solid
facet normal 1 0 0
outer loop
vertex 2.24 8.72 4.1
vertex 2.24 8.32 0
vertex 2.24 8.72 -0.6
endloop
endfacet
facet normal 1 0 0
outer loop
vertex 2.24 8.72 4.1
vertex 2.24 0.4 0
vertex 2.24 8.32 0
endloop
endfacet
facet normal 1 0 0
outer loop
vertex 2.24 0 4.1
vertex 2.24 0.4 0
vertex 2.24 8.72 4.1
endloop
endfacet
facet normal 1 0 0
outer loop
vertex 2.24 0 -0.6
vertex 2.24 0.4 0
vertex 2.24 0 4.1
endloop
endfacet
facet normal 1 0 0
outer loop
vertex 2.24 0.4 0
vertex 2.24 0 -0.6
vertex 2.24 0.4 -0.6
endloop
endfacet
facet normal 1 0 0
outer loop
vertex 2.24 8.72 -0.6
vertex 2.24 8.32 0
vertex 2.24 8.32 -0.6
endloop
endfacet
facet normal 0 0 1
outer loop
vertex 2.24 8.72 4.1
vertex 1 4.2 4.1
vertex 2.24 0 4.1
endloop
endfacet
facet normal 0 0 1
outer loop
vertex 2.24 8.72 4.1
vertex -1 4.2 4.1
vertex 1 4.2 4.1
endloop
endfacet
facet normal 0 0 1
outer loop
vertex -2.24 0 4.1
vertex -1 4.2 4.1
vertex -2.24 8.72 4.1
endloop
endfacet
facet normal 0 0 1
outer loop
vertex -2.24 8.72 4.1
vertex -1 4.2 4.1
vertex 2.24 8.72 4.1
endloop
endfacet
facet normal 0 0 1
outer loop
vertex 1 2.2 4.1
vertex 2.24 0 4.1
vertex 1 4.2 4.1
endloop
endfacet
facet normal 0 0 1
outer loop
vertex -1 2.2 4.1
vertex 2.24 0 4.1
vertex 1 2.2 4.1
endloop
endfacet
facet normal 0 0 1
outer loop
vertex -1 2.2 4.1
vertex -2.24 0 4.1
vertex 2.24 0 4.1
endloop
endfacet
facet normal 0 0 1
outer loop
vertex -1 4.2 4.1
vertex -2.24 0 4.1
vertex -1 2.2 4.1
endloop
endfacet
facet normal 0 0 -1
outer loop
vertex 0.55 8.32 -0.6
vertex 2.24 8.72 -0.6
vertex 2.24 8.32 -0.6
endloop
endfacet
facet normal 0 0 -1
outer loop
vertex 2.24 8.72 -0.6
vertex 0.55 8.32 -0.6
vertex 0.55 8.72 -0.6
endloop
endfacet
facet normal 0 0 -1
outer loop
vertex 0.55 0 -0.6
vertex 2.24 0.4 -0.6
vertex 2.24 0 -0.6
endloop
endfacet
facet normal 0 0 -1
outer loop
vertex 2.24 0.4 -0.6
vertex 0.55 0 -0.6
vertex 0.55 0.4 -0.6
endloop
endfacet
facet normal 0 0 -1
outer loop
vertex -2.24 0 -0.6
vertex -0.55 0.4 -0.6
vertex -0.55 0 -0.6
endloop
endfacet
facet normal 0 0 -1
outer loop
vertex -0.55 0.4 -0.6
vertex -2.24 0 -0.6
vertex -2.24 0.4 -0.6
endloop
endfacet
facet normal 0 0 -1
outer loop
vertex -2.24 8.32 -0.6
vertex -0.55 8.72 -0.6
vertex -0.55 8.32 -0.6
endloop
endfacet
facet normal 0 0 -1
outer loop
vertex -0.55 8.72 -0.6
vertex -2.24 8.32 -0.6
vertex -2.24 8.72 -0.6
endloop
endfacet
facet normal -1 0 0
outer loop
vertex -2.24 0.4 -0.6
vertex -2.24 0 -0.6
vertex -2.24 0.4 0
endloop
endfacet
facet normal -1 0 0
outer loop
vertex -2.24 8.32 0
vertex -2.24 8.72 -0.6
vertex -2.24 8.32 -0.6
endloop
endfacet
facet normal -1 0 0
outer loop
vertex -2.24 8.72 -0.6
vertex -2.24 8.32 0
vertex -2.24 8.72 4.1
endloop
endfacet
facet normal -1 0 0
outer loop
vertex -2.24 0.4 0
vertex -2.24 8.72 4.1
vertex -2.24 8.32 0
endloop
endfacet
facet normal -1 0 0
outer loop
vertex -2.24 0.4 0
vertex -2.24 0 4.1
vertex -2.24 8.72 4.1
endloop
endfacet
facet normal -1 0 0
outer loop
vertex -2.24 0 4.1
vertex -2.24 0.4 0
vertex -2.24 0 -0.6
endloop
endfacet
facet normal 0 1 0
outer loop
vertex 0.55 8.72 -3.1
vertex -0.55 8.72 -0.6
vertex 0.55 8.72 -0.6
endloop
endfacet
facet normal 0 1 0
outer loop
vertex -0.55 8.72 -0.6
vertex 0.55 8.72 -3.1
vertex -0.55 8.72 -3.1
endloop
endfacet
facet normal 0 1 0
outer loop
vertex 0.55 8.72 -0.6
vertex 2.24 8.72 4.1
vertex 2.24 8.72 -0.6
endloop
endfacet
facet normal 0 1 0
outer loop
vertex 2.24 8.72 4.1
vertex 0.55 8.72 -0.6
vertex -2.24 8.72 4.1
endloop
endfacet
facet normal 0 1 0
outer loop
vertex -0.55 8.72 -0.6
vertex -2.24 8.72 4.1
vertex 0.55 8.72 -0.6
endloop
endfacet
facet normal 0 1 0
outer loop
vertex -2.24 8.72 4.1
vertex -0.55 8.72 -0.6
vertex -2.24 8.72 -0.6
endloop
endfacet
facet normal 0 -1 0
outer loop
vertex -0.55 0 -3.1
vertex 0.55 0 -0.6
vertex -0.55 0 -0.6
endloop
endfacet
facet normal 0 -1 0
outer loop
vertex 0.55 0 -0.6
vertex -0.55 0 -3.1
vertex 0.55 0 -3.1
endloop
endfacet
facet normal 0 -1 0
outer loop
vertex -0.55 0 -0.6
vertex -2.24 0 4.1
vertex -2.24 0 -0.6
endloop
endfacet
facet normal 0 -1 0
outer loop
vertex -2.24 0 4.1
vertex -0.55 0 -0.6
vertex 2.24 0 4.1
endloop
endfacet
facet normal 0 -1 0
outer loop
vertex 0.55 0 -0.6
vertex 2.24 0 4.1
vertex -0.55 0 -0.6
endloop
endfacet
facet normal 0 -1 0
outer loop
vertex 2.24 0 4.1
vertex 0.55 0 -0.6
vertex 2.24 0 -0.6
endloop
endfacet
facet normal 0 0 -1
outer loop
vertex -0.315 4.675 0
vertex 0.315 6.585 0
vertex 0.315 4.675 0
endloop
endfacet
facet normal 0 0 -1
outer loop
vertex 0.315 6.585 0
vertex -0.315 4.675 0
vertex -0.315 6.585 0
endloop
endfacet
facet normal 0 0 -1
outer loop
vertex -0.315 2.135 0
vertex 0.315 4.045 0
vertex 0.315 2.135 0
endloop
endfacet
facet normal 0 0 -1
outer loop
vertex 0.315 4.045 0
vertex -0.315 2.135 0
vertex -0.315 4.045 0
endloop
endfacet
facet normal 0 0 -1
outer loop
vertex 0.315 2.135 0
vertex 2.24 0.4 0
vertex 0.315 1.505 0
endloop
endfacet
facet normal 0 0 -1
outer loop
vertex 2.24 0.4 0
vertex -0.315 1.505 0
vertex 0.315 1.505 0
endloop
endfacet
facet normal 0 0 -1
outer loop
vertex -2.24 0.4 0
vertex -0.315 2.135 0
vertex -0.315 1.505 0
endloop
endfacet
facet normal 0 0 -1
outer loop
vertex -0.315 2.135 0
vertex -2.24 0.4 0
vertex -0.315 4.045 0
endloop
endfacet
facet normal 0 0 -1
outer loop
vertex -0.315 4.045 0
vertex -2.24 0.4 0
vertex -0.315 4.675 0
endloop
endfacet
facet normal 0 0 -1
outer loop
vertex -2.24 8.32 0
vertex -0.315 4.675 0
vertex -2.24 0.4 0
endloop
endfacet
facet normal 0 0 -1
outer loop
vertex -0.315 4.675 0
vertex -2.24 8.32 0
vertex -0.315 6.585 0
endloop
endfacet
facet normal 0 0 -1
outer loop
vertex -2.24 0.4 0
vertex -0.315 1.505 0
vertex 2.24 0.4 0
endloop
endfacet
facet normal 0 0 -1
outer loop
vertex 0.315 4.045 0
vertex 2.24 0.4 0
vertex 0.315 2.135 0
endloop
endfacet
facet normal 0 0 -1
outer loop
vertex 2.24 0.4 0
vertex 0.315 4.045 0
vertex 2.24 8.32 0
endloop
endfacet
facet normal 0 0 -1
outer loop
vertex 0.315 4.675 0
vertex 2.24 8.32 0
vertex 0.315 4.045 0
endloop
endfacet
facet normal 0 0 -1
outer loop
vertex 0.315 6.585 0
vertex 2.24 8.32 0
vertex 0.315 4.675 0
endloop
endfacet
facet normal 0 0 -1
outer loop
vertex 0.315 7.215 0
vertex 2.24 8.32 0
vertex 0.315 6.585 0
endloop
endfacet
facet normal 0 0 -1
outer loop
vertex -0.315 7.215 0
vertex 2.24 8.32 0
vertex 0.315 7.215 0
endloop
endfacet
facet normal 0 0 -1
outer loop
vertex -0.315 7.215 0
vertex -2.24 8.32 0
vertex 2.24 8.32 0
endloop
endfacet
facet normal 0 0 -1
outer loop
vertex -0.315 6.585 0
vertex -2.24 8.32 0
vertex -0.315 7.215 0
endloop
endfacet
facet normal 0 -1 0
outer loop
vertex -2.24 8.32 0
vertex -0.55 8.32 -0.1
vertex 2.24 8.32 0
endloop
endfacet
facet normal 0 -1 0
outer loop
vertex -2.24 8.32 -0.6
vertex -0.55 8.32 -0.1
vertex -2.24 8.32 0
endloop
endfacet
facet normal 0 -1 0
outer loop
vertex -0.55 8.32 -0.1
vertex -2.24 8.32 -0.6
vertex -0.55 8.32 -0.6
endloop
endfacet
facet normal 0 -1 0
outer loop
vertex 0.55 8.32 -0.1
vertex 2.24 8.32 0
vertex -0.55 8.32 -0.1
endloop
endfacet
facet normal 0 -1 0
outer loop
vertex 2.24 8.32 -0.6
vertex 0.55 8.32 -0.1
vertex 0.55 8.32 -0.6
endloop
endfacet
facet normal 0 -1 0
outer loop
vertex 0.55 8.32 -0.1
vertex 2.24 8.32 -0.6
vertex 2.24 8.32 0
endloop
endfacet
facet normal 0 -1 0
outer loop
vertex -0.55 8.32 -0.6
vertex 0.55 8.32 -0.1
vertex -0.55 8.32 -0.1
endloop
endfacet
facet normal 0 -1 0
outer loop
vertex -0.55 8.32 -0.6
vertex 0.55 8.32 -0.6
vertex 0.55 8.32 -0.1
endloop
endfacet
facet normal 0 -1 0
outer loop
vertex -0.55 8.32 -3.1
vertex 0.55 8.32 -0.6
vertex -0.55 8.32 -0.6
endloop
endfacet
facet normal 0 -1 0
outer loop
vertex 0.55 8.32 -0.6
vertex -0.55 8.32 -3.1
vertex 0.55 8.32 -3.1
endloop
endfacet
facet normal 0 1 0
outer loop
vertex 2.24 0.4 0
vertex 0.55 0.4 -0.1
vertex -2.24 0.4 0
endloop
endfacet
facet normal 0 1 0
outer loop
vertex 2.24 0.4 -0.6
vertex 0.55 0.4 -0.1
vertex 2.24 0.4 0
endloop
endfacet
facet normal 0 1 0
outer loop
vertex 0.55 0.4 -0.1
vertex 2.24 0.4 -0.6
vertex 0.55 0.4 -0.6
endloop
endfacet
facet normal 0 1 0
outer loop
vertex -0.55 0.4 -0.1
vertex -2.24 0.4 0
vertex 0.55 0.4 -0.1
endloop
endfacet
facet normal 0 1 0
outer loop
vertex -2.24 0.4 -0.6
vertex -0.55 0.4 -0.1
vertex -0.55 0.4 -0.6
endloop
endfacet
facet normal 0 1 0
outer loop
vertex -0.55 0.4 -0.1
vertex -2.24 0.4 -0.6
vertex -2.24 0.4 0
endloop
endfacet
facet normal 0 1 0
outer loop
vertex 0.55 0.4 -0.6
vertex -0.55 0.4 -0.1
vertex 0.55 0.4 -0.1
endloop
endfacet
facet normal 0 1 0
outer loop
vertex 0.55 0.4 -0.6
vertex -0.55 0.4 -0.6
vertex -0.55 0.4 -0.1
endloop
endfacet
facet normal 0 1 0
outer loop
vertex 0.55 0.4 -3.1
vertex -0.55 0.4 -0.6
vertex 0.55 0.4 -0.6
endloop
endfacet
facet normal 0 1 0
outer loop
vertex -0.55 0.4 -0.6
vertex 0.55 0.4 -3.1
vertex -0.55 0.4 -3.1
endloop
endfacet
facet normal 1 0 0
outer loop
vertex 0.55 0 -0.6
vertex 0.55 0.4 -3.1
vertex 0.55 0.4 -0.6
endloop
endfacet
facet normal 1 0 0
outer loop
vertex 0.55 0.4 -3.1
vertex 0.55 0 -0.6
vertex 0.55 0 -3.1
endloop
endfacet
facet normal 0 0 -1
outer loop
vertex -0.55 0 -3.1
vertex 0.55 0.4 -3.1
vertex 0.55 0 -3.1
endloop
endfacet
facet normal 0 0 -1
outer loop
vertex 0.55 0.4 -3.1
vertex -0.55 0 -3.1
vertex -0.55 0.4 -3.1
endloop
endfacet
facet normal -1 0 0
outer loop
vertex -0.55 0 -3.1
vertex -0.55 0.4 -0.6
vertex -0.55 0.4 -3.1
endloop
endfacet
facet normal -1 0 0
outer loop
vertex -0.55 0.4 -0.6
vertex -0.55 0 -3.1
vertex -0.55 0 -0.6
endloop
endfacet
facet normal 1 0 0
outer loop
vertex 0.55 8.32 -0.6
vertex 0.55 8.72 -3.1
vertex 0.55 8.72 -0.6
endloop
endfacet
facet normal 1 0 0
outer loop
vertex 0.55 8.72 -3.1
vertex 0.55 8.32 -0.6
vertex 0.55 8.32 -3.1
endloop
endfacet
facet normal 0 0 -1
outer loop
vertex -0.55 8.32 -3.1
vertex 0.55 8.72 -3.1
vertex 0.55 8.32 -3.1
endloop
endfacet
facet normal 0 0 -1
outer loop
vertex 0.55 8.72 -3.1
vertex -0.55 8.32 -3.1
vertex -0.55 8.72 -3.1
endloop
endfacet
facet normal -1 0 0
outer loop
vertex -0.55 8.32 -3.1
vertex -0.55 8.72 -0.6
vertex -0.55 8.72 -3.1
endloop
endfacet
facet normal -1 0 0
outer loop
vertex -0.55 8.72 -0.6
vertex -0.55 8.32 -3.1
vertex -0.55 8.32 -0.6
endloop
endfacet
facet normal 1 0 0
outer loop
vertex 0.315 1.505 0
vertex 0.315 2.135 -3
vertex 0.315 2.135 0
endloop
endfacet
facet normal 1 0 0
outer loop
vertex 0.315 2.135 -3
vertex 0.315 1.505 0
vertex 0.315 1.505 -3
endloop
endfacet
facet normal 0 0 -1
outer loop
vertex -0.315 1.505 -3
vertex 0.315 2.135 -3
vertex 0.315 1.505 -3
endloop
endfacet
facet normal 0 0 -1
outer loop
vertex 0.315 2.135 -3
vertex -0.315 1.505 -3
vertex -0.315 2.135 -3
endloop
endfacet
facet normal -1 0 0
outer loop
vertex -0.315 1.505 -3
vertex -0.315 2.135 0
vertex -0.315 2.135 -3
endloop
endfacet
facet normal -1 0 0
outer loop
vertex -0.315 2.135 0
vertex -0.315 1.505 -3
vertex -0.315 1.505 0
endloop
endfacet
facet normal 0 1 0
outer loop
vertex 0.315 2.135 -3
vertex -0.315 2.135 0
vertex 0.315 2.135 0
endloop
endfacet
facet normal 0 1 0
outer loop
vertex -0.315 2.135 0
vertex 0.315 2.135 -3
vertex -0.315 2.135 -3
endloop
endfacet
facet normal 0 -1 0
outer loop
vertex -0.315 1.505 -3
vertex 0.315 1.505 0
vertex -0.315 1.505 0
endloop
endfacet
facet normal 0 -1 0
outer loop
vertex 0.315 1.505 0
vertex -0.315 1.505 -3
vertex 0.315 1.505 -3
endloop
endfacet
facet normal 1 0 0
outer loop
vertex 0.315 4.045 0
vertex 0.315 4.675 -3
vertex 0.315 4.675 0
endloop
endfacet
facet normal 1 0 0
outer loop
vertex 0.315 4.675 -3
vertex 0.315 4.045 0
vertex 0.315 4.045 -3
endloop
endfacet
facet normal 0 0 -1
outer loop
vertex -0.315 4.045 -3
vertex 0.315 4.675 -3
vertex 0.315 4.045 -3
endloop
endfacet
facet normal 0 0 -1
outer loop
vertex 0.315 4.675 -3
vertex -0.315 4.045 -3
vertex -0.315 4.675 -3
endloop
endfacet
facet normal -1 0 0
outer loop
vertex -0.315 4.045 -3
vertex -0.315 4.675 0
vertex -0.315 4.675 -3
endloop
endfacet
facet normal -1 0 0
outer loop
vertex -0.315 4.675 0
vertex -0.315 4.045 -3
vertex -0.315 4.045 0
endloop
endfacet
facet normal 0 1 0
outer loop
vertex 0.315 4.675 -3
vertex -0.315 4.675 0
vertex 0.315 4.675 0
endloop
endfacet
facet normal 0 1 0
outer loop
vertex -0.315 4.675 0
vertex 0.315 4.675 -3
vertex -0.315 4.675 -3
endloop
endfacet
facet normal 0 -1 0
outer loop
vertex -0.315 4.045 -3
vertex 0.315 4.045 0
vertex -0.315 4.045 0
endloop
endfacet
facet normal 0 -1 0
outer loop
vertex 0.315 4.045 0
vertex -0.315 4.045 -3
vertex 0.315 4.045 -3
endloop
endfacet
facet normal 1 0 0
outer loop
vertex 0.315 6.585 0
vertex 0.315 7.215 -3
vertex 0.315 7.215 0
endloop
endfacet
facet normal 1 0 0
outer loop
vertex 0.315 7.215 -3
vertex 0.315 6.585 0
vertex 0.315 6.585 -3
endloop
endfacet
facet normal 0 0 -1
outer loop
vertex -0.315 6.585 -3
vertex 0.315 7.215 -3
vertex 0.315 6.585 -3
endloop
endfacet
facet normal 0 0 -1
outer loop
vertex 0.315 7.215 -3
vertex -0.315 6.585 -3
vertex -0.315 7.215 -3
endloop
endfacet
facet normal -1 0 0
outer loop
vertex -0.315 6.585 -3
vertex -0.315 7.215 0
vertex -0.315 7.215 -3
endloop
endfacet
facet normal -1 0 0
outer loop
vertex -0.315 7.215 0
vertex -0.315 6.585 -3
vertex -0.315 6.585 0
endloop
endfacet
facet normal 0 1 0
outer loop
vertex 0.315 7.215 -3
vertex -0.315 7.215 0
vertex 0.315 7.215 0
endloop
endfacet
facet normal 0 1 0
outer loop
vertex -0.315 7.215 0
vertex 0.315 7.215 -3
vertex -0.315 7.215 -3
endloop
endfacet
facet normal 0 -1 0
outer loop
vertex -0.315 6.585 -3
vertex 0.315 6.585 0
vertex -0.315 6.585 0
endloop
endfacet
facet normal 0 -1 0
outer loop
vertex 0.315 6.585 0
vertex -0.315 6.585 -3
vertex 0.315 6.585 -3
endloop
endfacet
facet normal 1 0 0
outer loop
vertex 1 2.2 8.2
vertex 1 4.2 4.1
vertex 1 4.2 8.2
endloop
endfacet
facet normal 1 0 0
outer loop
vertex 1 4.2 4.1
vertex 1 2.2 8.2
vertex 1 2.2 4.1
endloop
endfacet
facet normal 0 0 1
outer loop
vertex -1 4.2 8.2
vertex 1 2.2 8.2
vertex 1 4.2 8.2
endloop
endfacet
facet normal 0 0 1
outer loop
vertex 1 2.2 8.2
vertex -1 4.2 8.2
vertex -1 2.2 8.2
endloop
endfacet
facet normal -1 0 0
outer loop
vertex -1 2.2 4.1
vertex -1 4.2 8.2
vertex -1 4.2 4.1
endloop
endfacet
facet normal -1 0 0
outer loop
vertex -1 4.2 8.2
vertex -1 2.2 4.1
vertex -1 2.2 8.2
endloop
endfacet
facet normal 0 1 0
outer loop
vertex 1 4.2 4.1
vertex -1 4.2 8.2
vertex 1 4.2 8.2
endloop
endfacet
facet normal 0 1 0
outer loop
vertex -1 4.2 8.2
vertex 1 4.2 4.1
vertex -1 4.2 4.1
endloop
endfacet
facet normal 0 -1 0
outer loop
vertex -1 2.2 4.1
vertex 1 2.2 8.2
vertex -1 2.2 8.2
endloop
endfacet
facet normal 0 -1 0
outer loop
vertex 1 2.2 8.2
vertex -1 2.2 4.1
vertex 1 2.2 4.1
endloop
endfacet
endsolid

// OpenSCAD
$fn = 300;

switch ();

module switch () {
    color ([0.8, 0.8, 0.8, 1]) {
        difference () {
            translate ([-2.24, 0, -0.6]) {
                cube ([4.48, 8.72, 4.7]);
            }
            translate ([-2.74, 0.4, -1.1]) {
                cube ([5.48, 7.92, 1.1]);
            }
        }
        translate ([-0.55, 0, -3.1]) {
            cube ([1.1, 0.4, 3]);
        }
        translate ([-0.55, 8.32, -3.1]) {
            cube ([1.1, 0.4, 3]);
        }
    }
    color ([1, 1, 0.7, 1]) {
        for (i = [-2.54: 2.54: 2.54]) {
            translate ([-0.315, 4.045 + i, -3]) {
                cube ([0.63, 0.63, 3]);
            }
        }
    }
    color ([0.1, 0.1, 0.1, 1]) {
        translate ([-1, 2.2, 3.6]) {
            cube ([2, 2, 4.6]);
        }
    }
}
